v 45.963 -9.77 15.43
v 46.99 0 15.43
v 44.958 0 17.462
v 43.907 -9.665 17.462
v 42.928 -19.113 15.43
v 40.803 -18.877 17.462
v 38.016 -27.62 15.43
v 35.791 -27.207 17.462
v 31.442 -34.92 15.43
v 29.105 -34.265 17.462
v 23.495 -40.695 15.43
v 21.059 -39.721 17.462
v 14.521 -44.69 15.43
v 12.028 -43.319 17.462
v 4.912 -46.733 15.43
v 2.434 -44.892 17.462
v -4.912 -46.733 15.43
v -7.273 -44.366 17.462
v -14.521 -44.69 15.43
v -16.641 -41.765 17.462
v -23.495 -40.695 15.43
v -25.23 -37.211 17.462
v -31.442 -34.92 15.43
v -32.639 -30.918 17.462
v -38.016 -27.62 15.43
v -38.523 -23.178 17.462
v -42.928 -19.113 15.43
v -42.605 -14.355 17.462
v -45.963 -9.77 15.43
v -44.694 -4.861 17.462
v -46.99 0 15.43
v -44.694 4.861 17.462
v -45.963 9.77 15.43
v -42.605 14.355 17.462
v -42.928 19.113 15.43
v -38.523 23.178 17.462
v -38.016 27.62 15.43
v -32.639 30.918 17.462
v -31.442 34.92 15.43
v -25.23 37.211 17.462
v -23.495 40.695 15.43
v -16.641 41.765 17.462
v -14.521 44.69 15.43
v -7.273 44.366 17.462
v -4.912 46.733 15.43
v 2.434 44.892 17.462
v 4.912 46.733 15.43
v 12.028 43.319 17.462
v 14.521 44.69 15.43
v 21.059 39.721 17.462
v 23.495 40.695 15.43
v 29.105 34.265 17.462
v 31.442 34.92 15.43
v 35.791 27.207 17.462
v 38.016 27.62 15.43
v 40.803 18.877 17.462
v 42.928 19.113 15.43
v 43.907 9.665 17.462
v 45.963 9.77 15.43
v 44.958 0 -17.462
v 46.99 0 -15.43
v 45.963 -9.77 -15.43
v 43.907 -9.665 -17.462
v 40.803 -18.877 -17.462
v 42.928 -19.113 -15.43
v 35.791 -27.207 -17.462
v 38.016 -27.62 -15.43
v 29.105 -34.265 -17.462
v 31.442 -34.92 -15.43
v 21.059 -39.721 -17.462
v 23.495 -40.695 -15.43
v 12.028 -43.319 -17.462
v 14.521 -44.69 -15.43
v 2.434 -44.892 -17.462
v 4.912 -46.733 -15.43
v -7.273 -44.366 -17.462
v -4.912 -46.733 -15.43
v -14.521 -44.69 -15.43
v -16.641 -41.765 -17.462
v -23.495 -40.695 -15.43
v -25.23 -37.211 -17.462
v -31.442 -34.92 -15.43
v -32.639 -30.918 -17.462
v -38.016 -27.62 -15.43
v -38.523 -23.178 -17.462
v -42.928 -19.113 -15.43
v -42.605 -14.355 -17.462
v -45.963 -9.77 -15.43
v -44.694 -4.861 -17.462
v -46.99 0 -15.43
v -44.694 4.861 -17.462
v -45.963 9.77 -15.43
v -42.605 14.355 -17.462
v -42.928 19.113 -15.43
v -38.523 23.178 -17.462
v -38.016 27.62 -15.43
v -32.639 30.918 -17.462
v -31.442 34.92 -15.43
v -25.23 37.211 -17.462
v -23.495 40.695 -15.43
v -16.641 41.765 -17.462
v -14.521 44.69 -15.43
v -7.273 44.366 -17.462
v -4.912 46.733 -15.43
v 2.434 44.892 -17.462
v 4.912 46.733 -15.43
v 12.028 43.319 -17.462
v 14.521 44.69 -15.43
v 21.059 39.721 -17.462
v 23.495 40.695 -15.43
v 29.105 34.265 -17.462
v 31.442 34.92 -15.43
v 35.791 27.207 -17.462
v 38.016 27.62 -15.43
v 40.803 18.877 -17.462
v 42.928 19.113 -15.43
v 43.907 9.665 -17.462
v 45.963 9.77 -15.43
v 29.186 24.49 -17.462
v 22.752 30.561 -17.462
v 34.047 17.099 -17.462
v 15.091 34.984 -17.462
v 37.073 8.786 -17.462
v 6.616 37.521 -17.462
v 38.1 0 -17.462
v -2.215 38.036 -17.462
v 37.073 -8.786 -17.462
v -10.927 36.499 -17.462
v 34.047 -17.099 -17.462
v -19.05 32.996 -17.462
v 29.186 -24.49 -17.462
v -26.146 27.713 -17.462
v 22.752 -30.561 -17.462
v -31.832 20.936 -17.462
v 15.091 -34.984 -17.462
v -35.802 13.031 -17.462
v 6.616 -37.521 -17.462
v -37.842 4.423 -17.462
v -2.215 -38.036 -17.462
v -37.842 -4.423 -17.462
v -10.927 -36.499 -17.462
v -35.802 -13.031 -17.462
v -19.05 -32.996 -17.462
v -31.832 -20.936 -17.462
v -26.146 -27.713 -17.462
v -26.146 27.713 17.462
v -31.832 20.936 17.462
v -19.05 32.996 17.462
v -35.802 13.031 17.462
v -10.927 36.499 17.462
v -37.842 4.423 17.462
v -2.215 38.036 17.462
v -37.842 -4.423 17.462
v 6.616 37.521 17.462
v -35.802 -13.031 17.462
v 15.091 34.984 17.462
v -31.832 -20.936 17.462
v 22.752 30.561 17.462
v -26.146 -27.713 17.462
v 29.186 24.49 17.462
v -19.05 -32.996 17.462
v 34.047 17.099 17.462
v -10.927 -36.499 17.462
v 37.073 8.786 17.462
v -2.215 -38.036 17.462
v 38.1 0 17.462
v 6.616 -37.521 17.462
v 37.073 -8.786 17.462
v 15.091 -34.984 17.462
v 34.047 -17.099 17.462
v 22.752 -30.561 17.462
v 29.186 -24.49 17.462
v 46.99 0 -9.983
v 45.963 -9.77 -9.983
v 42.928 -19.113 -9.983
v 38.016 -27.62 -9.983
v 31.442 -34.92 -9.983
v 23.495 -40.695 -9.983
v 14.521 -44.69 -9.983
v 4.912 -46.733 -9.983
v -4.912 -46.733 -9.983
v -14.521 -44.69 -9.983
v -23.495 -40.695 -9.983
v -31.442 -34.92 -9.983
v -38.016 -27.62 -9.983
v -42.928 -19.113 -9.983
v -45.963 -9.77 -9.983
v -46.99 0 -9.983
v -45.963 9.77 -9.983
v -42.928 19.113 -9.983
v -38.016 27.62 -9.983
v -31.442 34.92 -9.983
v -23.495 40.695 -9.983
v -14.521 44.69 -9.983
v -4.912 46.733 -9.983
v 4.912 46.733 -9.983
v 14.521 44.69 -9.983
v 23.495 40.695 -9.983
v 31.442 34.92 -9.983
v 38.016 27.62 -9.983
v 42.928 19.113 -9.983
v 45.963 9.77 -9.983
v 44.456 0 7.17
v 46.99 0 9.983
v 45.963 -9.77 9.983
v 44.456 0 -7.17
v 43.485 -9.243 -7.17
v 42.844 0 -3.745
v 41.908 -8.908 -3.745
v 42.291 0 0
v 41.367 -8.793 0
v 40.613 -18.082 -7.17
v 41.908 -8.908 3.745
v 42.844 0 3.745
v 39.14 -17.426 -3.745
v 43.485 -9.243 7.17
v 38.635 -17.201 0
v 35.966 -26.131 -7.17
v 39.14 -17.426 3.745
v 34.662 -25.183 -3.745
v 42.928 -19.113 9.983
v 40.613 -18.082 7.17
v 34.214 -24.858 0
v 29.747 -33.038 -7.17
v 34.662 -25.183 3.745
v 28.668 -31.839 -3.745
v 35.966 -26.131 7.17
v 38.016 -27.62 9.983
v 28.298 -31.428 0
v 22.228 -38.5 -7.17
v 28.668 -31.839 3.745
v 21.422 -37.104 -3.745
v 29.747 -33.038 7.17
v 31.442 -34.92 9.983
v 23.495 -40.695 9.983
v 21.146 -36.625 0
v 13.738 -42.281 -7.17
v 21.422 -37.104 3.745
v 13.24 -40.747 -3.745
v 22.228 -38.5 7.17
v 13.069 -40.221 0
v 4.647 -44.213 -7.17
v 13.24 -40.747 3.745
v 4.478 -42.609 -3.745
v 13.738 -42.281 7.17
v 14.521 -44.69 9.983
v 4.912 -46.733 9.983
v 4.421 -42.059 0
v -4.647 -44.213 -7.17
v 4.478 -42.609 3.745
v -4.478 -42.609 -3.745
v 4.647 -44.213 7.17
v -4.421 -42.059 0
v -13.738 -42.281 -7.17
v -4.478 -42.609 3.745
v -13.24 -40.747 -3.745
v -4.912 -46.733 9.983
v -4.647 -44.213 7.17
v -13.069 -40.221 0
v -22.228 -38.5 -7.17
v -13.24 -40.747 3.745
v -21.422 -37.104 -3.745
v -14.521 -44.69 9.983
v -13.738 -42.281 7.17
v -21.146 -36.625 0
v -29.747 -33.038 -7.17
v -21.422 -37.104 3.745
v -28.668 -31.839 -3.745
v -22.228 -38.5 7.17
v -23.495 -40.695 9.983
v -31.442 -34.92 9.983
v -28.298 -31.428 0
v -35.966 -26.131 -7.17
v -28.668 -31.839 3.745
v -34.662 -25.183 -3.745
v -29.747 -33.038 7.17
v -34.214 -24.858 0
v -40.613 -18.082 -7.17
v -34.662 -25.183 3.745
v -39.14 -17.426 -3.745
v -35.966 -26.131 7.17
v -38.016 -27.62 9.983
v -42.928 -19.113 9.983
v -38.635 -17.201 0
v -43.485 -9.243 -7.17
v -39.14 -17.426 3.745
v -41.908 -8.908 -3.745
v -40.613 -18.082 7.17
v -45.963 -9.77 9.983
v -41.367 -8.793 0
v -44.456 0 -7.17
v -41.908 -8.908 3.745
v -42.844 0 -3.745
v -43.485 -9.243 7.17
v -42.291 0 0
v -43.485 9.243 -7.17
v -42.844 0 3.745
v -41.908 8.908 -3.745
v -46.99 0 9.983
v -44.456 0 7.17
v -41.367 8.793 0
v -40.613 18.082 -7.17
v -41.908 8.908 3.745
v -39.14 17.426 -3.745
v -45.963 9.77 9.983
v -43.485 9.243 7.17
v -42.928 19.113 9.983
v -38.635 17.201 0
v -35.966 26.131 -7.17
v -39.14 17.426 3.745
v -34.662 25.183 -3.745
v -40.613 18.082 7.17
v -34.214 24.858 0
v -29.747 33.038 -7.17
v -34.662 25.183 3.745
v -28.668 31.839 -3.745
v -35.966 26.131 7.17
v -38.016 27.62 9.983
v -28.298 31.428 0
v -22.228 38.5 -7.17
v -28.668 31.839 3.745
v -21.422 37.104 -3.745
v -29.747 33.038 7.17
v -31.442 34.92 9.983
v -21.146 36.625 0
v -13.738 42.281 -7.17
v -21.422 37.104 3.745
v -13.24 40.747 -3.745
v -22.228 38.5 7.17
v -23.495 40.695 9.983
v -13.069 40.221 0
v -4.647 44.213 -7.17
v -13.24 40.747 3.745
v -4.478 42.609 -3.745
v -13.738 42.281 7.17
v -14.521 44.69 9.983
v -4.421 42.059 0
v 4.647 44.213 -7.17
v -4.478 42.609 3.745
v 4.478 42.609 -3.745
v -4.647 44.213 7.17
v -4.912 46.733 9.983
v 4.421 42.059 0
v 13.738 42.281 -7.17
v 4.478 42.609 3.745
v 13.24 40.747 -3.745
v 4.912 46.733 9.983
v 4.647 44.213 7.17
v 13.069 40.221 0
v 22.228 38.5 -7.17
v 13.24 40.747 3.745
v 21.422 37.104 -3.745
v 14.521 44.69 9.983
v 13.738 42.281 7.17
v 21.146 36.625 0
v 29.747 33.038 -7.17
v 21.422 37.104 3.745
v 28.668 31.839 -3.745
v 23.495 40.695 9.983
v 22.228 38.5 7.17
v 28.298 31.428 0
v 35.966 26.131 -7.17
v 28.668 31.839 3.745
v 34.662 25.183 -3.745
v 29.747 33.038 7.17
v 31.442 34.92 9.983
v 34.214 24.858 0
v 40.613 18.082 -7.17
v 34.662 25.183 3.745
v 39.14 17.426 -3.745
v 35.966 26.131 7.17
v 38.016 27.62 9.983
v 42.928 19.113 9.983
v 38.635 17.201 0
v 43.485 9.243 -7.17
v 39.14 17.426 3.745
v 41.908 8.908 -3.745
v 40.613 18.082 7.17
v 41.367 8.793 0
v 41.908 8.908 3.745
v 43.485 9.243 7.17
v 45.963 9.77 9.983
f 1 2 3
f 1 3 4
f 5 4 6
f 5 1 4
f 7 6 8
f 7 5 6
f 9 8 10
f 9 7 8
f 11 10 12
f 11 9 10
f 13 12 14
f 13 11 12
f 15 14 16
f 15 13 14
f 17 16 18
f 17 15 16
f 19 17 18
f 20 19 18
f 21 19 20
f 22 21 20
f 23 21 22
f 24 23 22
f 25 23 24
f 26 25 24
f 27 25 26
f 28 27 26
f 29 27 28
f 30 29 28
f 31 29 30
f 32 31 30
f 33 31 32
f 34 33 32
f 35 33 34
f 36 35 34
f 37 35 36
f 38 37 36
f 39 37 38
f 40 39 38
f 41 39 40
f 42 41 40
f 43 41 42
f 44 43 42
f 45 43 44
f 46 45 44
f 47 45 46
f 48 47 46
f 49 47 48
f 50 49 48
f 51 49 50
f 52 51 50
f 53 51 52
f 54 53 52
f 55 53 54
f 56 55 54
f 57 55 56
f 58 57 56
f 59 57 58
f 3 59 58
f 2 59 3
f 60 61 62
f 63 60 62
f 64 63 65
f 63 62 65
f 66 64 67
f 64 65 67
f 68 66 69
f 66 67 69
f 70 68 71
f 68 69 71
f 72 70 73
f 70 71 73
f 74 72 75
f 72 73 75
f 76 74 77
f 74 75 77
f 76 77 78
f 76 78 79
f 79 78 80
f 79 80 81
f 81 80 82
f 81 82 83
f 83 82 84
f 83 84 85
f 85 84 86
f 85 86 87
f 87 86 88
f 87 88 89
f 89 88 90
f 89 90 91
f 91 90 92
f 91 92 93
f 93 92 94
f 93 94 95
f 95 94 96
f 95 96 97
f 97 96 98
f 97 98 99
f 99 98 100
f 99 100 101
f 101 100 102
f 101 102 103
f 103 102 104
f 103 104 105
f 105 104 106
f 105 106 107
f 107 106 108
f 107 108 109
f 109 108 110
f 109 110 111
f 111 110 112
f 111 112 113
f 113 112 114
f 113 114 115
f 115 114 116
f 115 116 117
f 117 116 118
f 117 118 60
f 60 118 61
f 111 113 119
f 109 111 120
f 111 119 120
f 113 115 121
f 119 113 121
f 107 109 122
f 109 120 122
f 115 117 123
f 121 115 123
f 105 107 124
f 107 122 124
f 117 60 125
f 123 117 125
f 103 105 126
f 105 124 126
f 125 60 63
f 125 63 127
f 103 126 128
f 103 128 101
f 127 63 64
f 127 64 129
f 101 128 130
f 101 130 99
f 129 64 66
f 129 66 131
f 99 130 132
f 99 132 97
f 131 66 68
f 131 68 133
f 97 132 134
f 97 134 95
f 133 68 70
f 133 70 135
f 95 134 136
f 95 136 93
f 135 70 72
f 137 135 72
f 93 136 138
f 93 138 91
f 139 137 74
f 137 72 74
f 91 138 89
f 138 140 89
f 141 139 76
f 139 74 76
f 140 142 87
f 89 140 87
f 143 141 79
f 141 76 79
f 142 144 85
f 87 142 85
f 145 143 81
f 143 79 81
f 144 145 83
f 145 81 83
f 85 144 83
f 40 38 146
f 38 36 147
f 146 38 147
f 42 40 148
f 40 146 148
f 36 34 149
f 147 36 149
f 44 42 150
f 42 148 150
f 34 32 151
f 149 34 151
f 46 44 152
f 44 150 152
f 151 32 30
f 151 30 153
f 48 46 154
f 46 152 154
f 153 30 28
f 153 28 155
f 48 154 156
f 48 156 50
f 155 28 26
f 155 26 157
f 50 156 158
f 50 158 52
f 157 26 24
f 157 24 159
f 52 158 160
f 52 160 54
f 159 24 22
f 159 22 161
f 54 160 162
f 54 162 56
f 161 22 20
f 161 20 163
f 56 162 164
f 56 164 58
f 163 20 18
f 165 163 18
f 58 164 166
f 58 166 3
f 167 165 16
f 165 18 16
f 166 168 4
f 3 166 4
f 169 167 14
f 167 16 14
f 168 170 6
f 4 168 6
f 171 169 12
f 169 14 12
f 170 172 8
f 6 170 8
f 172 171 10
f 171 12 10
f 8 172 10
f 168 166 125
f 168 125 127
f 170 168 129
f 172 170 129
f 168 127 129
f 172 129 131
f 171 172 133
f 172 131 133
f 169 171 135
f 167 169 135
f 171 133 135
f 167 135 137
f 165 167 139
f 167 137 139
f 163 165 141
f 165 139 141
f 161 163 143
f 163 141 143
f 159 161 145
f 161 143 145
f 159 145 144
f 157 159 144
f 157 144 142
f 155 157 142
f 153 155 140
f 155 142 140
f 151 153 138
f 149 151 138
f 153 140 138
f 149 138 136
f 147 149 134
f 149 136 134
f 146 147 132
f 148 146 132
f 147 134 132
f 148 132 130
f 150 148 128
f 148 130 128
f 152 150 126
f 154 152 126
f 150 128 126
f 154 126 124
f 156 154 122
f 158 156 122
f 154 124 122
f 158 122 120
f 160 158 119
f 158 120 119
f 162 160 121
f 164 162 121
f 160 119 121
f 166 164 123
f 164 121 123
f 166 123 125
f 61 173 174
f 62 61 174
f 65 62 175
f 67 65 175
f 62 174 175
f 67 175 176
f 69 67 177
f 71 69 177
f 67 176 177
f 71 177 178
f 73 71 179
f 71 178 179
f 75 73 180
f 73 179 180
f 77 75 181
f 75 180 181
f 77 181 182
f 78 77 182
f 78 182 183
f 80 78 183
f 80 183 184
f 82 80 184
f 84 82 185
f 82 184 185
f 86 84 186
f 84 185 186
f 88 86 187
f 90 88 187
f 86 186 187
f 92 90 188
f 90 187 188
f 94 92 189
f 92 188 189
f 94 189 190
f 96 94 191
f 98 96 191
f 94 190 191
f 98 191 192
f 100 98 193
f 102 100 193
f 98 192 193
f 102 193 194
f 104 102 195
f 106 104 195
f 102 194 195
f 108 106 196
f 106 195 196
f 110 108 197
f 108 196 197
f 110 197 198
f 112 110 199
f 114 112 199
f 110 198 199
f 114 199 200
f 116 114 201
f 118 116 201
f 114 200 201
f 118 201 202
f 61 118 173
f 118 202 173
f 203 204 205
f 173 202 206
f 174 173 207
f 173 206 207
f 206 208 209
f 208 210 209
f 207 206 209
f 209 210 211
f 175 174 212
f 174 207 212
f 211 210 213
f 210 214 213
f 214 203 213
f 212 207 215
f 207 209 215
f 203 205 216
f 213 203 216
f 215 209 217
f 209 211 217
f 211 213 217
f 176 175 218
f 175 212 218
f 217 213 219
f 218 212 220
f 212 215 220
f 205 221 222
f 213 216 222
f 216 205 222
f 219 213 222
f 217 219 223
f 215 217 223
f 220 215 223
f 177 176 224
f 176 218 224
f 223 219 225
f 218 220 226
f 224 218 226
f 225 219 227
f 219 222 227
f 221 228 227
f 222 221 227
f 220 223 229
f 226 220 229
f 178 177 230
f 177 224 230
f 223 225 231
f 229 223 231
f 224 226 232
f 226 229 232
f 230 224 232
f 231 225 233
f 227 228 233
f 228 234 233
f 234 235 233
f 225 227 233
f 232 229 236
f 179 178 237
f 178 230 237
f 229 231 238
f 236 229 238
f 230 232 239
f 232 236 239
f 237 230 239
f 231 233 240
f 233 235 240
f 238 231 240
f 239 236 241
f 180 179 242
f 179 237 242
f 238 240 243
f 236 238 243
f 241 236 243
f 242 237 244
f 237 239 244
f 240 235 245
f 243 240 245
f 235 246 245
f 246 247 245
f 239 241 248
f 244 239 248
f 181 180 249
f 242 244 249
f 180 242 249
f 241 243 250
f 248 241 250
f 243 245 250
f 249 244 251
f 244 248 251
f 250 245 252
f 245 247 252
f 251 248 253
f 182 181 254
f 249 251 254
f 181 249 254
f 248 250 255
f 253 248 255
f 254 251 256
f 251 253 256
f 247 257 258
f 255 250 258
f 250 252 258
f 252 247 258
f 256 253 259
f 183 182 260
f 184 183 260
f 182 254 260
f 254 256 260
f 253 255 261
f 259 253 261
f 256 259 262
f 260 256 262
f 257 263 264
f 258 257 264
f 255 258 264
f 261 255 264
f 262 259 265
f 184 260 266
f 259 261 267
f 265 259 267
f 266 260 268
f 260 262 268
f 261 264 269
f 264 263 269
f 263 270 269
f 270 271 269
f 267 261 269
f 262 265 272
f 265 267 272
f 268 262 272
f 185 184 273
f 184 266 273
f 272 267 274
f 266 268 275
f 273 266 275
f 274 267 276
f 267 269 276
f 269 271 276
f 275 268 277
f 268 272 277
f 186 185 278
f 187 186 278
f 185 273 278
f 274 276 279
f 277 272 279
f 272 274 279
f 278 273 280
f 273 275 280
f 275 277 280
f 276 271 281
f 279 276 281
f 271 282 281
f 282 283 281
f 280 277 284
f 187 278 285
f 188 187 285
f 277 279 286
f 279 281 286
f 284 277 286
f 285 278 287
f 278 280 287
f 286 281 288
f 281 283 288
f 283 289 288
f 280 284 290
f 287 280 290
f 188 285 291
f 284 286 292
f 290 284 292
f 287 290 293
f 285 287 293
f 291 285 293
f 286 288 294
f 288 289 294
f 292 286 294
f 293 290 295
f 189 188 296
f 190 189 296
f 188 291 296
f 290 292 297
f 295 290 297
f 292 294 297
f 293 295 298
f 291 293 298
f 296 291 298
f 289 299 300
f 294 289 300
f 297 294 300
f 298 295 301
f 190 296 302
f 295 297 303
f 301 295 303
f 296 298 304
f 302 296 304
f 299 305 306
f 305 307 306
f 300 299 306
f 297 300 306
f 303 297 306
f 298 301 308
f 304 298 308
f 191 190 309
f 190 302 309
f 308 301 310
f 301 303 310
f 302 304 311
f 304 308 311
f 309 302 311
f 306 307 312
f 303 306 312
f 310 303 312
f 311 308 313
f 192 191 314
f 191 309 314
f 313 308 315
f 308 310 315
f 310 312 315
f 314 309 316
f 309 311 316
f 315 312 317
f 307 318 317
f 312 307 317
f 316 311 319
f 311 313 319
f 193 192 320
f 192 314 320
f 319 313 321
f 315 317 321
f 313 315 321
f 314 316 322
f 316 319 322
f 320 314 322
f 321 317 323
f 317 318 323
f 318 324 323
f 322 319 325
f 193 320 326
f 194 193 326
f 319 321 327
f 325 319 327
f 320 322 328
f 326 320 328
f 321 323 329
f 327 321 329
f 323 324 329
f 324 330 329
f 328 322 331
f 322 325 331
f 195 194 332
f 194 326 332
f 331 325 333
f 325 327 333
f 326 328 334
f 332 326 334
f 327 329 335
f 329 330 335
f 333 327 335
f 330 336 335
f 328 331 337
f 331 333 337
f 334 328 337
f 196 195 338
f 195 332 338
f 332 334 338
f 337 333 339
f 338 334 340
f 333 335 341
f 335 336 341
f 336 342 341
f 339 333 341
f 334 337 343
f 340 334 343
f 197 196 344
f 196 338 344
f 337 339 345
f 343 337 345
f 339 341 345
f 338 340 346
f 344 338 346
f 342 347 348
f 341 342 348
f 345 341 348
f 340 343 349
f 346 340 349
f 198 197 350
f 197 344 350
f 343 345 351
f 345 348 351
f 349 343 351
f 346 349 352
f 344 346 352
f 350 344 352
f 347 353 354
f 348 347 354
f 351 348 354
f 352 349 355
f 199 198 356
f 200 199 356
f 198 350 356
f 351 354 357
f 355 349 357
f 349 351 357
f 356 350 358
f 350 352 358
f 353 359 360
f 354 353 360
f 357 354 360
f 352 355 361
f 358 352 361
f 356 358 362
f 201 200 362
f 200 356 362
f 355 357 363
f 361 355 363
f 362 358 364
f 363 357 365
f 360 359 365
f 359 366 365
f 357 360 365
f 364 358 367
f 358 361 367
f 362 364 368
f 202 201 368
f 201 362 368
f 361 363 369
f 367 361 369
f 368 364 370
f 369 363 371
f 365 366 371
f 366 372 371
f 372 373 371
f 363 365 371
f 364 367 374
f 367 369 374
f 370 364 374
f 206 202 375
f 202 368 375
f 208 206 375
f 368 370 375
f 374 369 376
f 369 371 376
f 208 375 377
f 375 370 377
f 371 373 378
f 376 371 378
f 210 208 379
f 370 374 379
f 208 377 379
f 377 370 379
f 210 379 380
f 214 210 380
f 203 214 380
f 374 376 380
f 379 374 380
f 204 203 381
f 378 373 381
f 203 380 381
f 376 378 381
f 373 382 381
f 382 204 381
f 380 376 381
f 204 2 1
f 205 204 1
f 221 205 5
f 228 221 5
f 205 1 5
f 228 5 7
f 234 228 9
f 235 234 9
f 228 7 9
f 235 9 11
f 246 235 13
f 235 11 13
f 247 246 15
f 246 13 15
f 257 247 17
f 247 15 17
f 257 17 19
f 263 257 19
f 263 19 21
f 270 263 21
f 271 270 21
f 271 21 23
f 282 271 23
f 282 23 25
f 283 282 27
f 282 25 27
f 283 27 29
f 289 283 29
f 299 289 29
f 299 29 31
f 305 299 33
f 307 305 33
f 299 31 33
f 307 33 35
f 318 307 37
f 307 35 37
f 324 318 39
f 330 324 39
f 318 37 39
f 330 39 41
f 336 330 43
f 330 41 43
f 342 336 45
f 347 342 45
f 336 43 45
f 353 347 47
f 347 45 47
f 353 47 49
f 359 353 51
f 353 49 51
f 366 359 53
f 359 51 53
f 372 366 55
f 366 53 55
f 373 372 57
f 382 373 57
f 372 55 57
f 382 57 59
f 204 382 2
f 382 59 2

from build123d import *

# Parameters (mm, degrees)
F3_SIZE = 2.032


with BuildPart() as f2:
    # F0 (on Front) → F2 (revolve)
    with BuildSketch(Plane.XZ):
        with BuildLine():
            Line((46.99, 17.4625), (38.1, 17.4625))
            Line((38.1, 17.4625), (38.1, -17.4625))
            Line((38.1, -17.4625), (46.99, -17.4625))
            Line((46.99, -17.4625), (46.99, -9.98304))
            ThreePointArc((46.99, -9.98304), (42.291, 0), (46.99, 9.98304))
            Line((46.99, 9.98304), (46.99, 17.4625))
        make_face()
    revolve(axis=Axis((0, 0, 0.613732), (0, 0, -1)))

    # F3
    f3_edges = [f2.edges().sort_by_distance(p)[0] for p in [
        (-46.99, 0, 17.4625),
        (-46.99, 0, -17.4625),
    ]]
    chamfer(f3_edges, length=F3_SIZE)


solid = f2.part
